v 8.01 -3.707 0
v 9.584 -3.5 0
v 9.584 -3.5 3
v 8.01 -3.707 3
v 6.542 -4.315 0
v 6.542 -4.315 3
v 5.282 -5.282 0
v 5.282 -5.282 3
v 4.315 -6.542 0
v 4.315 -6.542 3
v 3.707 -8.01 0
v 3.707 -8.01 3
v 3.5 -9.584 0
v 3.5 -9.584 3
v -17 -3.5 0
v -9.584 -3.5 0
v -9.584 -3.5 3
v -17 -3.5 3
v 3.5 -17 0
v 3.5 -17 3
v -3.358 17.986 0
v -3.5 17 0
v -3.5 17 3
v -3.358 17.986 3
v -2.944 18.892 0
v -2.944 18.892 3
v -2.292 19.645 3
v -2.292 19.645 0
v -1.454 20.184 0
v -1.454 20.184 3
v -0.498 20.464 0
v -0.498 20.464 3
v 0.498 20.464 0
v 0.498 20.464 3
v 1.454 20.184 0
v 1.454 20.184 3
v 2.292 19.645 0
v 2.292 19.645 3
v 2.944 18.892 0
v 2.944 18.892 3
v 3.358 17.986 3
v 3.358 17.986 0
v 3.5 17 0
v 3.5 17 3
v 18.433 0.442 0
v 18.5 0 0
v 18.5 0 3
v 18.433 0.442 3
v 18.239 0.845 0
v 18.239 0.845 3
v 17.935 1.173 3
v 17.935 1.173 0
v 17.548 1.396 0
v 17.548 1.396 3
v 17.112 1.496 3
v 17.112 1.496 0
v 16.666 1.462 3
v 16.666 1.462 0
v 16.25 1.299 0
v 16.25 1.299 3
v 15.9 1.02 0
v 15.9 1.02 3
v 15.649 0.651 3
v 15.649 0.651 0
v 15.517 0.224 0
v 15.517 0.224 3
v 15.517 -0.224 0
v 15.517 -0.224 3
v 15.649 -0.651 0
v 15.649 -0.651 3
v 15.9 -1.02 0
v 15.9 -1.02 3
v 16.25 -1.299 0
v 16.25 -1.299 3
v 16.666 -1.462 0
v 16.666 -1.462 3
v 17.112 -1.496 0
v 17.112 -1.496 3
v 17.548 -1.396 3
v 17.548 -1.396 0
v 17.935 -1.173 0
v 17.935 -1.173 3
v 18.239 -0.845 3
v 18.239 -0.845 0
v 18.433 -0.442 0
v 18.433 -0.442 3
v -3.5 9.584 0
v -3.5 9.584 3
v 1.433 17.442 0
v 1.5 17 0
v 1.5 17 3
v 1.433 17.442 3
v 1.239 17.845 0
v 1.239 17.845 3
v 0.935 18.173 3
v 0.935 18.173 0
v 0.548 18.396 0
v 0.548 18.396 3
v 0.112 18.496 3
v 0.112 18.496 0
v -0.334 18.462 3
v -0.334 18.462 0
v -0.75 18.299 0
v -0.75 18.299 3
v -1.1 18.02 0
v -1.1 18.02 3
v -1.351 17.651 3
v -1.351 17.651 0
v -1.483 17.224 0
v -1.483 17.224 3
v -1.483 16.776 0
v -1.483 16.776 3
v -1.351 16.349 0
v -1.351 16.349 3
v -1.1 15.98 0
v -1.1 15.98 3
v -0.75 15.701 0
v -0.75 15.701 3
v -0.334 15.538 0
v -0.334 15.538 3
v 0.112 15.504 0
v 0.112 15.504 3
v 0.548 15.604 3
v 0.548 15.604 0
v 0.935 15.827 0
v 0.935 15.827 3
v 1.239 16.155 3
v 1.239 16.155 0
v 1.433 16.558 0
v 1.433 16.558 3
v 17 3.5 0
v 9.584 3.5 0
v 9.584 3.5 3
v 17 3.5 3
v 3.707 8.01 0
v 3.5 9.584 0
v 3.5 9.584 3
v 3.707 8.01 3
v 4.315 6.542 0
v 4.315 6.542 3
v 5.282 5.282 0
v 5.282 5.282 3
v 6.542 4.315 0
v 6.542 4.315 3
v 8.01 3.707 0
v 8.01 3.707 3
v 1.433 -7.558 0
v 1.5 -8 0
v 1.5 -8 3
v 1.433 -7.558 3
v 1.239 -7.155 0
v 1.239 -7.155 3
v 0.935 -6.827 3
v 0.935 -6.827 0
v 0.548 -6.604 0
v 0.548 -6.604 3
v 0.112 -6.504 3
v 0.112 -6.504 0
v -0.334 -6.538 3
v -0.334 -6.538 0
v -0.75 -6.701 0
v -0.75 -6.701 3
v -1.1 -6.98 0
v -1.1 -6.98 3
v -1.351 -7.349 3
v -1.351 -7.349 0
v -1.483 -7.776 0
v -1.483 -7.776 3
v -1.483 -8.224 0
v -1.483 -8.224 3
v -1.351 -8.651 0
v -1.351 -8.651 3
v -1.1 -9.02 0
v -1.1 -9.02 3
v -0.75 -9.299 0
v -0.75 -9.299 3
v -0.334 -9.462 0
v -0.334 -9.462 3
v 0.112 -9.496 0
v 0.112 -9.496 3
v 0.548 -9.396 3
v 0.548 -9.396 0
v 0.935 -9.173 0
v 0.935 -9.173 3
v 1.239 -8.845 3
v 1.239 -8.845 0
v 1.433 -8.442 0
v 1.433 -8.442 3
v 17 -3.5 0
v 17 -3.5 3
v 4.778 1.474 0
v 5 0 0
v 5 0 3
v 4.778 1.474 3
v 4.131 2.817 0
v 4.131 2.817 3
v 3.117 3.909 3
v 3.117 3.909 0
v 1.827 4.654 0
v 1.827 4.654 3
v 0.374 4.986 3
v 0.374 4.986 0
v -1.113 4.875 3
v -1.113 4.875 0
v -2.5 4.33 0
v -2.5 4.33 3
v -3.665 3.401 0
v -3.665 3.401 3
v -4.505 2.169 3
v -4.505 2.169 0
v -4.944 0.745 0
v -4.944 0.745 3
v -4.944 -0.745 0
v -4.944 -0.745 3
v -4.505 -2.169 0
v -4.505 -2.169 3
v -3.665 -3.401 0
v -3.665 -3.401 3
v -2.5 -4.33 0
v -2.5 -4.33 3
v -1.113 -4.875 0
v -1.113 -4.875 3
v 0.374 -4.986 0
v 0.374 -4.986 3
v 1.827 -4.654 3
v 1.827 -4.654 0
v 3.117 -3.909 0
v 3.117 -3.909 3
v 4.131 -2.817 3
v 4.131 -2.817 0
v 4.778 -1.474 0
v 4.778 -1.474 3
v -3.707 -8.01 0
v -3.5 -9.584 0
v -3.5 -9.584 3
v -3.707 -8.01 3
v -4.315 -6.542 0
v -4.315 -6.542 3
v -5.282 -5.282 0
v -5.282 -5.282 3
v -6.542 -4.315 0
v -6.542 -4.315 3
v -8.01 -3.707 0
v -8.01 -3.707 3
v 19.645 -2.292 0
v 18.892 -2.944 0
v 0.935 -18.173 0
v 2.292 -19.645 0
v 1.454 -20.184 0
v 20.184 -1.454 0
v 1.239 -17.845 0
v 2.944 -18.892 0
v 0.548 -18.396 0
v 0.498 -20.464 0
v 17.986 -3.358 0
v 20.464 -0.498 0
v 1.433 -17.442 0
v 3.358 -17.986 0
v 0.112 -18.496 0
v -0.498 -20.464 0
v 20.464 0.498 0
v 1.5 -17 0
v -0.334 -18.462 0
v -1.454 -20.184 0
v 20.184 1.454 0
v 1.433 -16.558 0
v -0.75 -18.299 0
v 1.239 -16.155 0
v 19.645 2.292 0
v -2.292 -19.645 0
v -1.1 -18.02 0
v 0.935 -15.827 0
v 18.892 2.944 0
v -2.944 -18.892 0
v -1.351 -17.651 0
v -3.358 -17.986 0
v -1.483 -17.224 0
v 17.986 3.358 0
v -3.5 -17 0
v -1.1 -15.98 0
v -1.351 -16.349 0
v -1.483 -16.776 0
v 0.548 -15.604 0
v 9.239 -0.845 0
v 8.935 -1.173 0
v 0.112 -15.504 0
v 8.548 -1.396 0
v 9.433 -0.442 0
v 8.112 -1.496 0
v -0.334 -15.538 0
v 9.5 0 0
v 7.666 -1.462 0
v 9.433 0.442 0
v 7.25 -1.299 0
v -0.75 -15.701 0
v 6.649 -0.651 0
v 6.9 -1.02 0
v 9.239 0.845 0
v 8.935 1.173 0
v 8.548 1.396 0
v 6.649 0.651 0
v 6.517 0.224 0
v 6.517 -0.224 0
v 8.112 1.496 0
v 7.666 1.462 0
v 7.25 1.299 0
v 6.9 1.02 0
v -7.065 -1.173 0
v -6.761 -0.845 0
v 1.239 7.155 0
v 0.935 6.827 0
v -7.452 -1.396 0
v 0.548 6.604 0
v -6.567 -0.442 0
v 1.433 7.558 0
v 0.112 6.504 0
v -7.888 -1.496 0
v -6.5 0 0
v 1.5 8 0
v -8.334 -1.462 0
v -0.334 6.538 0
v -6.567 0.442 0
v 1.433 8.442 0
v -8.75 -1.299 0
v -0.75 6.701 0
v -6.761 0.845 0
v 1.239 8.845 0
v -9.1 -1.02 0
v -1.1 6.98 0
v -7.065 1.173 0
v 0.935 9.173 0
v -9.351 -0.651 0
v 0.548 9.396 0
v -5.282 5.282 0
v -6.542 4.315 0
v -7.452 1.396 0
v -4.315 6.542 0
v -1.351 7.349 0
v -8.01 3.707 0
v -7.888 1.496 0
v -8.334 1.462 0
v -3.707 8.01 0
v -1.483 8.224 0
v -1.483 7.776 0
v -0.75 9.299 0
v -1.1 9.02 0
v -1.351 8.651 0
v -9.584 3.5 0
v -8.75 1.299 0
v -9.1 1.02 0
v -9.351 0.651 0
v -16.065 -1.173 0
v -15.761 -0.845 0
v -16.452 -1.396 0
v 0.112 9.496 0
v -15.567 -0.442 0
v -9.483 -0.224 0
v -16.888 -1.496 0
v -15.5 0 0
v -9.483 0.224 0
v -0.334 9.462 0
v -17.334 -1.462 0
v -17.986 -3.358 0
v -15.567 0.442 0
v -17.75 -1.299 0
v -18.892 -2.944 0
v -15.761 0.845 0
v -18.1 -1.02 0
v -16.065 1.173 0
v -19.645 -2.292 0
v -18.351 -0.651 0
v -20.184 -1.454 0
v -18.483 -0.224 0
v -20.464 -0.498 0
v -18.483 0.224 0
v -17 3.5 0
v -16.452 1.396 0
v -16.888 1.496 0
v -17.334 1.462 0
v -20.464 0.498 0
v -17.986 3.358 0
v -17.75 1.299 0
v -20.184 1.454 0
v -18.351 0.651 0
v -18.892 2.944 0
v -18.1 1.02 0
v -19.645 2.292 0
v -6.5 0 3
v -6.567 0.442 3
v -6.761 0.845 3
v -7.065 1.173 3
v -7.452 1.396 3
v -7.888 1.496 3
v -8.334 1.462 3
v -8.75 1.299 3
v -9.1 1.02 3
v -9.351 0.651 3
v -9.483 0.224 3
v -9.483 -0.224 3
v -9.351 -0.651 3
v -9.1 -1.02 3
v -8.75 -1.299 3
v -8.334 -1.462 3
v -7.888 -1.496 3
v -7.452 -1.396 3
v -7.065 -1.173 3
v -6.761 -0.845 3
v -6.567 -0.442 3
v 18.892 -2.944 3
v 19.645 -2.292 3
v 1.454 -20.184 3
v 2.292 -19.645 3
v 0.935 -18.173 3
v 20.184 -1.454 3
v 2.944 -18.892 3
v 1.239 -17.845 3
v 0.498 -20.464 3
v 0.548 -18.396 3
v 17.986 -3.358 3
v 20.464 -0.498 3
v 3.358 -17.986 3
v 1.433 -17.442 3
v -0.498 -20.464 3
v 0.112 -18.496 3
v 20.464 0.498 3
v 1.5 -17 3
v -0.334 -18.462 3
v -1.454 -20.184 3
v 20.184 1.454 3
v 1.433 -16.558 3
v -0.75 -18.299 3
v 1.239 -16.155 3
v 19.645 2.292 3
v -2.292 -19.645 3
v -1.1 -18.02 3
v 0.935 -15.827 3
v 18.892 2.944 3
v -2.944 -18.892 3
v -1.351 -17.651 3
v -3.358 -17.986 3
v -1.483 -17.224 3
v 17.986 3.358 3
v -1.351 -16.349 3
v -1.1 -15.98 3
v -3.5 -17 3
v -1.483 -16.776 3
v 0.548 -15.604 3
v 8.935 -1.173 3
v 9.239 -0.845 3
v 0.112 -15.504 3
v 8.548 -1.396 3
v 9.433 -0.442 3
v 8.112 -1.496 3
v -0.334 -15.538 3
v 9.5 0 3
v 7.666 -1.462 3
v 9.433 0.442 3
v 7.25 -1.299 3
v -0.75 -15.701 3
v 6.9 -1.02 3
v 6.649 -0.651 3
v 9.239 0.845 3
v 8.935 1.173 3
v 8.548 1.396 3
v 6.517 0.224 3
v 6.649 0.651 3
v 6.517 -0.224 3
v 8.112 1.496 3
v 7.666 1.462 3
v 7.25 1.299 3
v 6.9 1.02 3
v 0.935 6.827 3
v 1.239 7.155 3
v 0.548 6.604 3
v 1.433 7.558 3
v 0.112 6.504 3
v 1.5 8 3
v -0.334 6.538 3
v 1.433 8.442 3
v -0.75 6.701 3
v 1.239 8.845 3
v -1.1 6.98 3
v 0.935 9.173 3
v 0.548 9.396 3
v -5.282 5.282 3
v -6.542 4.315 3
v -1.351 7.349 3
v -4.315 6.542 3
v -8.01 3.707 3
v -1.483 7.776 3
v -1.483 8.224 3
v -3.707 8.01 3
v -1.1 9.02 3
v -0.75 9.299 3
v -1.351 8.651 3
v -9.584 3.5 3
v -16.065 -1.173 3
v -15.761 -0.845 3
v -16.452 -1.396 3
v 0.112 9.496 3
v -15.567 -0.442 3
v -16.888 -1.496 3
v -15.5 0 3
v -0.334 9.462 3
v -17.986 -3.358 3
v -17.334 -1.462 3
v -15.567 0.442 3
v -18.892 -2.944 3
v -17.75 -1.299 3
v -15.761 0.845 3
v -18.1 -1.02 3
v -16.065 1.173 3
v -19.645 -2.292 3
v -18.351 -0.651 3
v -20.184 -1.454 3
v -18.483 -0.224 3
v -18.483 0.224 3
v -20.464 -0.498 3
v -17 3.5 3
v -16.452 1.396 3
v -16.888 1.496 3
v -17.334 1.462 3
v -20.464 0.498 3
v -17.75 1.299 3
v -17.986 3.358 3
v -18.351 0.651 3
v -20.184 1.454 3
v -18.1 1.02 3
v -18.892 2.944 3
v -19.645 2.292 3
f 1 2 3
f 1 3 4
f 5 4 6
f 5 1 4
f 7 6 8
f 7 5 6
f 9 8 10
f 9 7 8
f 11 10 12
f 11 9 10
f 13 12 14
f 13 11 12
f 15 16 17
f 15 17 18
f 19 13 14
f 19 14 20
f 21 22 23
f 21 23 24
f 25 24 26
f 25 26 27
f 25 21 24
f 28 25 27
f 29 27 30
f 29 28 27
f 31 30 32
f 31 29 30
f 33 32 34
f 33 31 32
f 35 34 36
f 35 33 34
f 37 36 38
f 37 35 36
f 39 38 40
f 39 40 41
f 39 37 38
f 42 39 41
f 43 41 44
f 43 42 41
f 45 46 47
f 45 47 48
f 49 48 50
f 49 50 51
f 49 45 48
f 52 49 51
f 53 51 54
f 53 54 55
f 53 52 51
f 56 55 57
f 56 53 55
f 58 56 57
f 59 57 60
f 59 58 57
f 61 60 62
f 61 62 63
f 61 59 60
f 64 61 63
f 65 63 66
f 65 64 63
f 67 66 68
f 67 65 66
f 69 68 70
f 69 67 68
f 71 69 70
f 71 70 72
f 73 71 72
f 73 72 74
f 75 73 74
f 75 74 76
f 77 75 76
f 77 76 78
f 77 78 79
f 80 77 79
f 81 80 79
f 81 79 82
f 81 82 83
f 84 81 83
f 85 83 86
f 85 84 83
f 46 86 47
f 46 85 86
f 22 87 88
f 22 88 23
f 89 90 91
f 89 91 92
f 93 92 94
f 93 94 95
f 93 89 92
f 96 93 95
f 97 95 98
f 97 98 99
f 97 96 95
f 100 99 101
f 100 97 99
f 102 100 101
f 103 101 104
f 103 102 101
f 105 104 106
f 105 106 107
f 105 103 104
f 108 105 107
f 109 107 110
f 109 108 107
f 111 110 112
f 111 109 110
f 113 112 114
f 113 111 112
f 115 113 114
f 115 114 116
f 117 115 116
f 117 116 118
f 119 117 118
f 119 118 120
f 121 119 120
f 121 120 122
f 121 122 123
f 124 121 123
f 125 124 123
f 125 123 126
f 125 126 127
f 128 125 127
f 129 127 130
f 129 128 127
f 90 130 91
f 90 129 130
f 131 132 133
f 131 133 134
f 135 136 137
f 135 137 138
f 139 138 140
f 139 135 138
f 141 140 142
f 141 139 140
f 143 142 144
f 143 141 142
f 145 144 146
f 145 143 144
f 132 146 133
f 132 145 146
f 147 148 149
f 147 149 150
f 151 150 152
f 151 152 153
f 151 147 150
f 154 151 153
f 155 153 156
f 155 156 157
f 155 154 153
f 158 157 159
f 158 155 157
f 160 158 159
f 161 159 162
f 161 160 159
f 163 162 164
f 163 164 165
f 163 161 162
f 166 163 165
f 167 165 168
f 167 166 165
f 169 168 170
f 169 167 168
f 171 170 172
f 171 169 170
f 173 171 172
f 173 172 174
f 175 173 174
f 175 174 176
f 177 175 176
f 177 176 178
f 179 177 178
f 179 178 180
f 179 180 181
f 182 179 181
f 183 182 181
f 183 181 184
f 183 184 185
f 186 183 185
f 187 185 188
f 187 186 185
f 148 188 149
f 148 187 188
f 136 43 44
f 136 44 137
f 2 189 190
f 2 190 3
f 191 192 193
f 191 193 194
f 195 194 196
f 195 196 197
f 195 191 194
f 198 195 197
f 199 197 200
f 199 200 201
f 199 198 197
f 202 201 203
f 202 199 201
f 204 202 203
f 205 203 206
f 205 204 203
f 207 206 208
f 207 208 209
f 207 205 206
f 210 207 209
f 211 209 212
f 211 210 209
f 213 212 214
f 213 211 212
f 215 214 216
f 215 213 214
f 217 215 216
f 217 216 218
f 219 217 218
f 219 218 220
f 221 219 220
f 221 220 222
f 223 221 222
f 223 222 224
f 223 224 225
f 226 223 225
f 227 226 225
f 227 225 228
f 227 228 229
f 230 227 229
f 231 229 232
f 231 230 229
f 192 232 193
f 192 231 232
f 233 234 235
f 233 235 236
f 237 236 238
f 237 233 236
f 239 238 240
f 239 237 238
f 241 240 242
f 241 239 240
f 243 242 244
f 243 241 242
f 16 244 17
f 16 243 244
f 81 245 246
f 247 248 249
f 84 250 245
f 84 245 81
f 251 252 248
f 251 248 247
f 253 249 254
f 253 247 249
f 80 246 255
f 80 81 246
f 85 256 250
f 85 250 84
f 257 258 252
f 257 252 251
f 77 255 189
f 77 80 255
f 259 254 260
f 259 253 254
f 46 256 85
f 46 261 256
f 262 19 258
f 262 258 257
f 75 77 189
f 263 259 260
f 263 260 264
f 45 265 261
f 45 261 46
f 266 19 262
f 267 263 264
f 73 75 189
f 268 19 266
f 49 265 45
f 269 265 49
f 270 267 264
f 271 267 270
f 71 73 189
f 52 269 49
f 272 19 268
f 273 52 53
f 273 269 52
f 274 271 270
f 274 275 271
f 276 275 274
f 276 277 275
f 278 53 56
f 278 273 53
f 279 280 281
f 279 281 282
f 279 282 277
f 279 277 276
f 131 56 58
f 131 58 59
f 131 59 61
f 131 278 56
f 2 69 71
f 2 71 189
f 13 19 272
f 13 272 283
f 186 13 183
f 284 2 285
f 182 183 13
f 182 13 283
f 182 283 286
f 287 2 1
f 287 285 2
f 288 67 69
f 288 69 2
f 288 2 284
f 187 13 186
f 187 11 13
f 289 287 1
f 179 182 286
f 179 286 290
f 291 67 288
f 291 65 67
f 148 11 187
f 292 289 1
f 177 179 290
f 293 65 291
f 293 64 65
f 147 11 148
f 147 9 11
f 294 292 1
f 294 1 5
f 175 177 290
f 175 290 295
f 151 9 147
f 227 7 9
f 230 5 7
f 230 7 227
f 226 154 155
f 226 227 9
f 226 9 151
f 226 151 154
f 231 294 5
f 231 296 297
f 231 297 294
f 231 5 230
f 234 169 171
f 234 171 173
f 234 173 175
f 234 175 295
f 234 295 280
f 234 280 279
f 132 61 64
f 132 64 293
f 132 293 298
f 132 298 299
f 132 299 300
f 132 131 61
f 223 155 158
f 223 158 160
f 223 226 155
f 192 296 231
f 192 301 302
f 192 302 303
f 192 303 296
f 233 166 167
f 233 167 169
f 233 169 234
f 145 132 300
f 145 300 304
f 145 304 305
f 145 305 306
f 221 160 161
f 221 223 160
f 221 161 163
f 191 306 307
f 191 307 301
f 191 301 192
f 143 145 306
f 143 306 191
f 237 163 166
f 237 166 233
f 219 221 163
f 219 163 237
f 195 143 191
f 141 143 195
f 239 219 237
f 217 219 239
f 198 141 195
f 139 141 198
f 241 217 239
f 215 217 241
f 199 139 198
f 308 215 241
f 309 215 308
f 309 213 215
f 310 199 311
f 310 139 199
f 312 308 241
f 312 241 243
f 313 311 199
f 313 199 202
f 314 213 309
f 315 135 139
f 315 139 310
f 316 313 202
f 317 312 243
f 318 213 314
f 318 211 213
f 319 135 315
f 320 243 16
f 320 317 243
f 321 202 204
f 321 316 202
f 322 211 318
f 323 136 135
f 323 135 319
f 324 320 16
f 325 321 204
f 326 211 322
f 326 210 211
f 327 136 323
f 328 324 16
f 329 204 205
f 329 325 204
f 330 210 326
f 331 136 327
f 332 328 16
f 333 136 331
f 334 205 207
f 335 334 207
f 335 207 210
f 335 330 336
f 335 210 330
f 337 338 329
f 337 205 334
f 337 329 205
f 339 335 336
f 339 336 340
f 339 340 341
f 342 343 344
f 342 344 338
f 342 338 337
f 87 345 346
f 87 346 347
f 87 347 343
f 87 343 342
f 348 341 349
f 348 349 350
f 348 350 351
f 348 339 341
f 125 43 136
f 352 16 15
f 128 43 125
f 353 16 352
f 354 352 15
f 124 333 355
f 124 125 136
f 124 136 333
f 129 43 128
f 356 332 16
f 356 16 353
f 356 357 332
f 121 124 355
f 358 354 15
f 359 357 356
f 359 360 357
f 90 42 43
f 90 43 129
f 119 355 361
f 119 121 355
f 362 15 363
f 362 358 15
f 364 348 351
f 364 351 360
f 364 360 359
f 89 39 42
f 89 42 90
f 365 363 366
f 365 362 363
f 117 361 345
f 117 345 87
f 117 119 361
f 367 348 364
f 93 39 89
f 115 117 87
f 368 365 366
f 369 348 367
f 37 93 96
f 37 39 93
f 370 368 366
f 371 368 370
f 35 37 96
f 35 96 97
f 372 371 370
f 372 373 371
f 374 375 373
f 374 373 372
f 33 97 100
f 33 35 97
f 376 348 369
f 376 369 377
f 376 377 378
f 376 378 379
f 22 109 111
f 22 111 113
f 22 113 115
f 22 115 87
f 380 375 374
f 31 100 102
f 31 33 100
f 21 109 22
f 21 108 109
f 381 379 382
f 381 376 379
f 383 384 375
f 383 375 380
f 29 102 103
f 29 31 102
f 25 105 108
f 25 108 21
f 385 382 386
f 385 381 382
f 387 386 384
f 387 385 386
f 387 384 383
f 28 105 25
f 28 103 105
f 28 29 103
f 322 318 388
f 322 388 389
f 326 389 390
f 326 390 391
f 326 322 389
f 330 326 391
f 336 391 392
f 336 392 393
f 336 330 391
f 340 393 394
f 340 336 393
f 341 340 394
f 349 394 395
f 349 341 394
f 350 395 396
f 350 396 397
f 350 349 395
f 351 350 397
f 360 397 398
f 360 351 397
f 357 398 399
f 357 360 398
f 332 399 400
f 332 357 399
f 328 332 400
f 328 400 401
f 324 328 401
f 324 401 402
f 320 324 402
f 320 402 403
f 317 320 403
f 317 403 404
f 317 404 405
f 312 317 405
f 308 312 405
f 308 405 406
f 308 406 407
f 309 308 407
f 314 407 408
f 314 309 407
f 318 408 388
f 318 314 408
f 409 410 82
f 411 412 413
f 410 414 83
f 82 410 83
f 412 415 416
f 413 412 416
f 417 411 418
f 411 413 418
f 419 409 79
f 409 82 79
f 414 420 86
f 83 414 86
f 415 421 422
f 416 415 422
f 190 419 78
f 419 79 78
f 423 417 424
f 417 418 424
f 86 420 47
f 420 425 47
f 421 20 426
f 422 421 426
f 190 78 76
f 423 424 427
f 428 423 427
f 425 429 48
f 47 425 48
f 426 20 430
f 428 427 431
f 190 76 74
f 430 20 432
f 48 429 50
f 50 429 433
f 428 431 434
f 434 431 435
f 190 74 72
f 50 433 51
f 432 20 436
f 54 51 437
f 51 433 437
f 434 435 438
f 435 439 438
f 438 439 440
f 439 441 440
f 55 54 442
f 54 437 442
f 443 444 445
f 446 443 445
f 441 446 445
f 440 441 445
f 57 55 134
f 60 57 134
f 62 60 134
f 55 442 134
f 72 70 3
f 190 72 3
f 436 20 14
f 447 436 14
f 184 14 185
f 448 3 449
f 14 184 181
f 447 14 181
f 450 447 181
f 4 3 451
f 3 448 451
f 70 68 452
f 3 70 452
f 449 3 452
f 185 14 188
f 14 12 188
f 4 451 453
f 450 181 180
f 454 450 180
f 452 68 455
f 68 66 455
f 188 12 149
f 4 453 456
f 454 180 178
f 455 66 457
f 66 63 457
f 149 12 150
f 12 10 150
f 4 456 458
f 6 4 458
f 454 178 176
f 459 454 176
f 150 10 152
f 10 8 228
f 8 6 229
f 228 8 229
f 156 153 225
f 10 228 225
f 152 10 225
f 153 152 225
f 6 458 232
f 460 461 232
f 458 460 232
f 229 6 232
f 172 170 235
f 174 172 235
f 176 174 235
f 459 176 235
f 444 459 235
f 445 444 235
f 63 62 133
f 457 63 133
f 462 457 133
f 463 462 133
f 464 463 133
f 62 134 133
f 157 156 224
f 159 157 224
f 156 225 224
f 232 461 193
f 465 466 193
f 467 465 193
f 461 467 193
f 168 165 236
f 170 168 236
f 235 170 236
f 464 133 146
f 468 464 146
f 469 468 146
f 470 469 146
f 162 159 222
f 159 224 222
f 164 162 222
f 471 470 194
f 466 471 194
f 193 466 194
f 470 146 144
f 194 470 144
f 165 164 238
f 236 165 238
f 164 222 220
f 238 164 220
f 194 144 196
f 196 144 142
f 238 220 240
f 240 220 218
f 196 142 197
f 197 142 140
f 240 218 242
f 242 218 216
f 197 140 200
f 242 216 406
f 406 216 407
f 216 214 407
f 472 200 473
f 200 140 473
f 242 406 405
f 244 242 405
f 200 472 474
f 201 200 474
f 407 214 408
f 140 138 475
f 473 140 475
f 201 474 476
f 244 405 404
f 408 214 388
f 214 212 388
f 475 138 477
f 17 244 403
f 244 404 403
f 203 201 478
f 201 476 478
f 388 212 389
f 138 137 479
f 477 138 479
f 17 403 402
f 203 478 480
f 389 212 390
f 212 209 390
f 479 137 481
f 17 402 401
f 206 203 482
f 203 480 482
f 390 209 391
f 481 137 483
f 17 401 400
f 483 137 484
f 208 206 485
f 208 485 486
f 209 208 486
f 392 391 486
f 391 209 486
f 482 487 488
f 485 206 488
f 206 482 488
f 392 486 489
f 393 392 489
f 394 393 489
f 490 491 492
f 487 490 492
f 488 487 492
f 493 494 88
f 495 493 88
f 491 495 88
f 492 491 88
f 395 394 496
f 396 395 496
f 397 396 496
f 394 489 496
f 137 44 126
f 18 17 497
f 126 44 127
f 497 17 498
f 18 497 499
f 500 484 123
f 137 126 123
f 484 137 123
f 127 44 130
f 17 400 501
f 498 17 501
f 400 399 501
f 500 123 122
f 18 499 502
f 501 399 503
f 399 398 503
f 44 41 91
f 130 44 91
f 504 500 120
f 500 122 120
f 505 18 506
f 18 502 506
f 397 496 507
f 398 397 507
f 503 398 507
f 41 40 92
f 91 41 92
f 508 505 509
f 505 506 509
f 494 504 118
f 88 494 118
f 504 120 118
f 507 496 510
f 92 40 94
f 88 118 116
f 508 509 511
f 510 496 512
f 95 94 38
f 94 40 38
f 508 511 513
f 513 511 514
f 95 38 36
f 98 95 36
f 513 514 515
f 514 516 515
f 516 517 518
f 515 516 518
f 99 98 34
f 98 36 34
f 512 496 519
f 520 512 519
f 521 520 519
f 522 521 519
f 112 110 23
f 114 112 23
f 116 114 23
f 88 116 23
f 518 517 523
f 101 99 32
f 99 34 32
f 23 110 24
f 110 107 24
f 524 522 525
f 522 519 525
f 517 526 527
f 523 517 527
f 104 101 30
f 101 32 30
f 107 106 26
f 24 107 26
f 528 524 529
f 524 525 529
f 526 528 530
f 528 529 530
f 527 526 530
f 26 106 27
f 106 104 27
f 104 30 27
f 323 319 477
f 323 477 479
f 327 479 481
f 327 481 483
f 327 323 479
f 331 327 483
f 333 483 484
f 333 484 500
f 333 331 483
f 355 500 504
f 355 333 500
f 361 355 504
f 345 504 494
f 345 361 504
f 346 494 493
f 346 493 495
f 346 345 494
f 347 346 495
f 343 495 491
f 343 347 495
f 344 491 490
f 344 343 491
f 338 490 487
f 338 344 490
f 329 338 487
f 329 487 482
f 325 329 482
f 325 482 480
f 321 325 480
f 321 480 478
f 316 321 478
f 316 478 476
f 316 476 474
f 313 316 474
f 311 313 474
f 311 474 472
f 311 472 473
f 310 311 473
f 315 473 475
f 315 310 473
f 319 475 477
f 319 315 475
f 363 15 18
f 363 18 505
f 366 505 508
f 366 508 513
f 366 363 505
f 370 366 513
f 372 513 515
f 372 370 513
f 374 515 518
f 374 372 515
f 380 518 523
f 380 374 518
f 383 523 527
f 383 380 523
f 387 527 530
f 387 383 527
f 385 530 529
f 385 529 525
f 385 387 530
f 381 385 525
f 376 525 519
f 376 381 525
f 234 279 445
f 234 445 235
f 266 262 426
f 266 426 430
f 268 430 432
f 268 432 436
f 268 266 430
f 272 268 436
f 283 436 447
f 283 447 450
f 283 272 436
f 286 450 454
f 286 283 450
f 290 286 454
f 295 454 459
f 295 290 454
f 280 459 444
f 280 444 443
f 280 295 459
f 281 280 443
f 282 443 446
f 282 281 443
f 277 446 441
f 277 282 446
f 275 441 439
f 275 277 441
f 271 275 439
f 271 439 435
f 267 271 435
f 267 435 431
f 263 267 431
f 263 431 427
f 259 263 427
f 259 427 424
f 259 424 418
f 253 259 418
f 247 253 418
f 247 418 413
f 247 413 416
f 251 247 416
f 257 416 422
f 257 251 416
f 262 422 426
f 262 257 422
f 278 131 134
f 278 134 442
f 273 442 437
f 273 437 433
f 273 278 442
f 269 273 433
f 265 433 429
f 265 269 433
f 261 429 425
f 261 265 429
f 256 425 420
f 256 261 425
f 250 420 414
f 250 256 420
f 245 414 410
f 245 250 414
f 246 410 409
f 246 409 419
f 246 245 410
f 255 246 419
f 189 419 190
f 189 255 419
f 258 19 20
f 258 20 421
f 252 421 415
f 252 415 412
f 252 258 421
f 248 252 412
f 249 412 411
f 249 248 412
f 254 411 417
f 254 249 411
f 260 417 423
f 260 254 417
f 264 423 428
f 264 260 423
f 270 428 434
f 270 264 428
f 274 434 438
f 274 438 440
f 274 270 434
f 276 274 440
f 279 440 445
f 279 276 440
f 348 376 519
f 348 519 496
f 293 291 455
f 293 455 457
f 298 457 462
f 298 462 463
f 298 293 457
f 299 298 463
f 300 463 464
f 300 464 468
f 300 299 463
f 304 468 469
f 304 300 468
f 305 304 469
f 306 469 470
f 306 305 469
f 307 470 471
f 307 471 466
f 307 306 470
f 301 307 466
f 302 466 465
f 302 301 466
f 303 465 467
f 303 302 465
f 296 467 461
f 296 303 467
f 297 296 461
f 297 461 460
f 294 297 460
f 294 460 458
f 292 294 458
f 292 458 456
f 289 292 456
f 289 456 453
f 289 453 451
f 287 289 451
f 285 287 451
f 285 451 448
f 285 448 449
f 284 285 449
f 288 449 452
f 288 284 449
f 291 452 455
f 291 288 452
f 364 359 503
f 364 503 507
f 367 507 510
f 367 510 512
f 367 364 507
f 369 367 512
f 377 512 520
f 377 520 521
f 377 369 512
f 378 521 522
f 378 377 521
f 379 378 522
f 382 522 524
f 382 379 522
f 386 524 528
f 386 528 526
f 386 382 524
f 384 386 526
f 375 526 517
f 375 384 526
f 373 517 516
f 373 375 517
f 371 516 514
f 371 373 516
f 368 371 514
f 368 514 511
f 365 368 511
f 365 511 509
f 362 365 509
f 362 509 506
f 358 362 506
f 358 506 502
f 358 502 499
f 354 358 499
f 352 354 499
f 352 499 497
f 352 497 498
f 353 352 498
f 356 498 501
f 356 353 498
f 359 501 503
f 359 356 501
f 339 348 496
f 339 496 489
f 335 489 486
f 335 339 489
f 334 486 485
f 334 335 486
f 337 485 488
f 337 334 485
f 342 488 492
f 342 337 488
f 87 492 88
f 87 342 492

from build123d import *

# Parameters (mm, degrees)
SKETCH1_R           = 5
SKETCH1_R_2         = 1.5
BOSS_EXTRUDE1_DEPTH = 3
CUT_EXTRUDE1_START  = -3
SKETCH2_R           = 1.5
CUT_EXTRUDE1_DEPTH  = 3


with BuildPart() as part:
    # Sketch1 → Boss-Extrude1 (new body)
    with BuildSketch(Plane.XY):
        with BuildLine():
            Line((-3.5, 9.584427843), (-3.5, 17))
            ThreePointArc((-3.5, 17), (0, 20.5), (3.5, 17))
            Line((3.5, 17), (3.5, 9.584427843))
            ThreePointArc((3.5, 9.584427843), (5.282087655, 5.282087655), (9.584427843, 3.5))
            Line((9.584427843, 3.5), (17, 3.5))
            ThreePointArc((17, 3.5), (20.5, 0), (17, -3.5))
            Line((17, -3.5), (9.584427843, -3.5))
            ThreePointArc((9.584427843, -3.5), (5.282087655, -5.282087655), (3.5, -9.584427843))
            Line((3.5, -9.584427843), (3.5, -17))
            ThreePointArc((3.5, -17), (0, -20.5), (-3.5, -17))
            Line((-3.5, -17), (-3.5, -9.584427843))
            ThreePointArc((-3.5, -9.584427843), (-5.282087655, -5.282087655), (-9.584427843, -3.5))
            Line((-9.584427843, -3.5), (-17, -3.5))
            ThreePointArc((-17, -3.5), (-20.5, 0), (-17, 3.5))
            Line((-17, 3.5), (-9.584427843, 3.5))
            ThreePointArc((-9.584427843, 3.5), (-5.282087655, 5.282087655), (-3.5, 9.584427843))
        make_face()
        Circle(SKETCH1_R, mode=Mode.SUBTRACT)
        with Locations((8, 0)):
            Circle(SKETCH1_R_2, mode=Mode.SUBTRACT)
        with Locations((17, 0)):
            Circle(SKETCH1_R_2, mode=Mode.SUBTRACT)
    extrude(amount=BOSS_EXTRUDE1_DEPTH)

    # Sketch2 → Cut-Extrude1 (cut)
    with BuildSketch(Plane.XY.offset(3).offset(CUT_EXTRUDE1_START)):
        with Locations((17, 0)):
            Circle(SKETCH2_R)
        with Locations((8, 0)):
            Circle(SKETCH2_R)
        with Locations((0, -8)):
            Circle(SKETCH2_R)
        with Locations((0, -17)):
            Circle(SKETCH2_R)
        with Locations((-8, 0)):
            Circle(SKETCH2_R)
        with Locations((-17, 0)):
            Circle(SKETCH2_R)
        with Locations((0, 8)):
            Circle(SKETCH2_R)
        with Locations((0, 17)):
            Circle(SKETCH2_R)
    extrude(amount=CUT_EXTRUDE1_DEPTH, mode=Mode.SUBTRACT)


solid = part.part
